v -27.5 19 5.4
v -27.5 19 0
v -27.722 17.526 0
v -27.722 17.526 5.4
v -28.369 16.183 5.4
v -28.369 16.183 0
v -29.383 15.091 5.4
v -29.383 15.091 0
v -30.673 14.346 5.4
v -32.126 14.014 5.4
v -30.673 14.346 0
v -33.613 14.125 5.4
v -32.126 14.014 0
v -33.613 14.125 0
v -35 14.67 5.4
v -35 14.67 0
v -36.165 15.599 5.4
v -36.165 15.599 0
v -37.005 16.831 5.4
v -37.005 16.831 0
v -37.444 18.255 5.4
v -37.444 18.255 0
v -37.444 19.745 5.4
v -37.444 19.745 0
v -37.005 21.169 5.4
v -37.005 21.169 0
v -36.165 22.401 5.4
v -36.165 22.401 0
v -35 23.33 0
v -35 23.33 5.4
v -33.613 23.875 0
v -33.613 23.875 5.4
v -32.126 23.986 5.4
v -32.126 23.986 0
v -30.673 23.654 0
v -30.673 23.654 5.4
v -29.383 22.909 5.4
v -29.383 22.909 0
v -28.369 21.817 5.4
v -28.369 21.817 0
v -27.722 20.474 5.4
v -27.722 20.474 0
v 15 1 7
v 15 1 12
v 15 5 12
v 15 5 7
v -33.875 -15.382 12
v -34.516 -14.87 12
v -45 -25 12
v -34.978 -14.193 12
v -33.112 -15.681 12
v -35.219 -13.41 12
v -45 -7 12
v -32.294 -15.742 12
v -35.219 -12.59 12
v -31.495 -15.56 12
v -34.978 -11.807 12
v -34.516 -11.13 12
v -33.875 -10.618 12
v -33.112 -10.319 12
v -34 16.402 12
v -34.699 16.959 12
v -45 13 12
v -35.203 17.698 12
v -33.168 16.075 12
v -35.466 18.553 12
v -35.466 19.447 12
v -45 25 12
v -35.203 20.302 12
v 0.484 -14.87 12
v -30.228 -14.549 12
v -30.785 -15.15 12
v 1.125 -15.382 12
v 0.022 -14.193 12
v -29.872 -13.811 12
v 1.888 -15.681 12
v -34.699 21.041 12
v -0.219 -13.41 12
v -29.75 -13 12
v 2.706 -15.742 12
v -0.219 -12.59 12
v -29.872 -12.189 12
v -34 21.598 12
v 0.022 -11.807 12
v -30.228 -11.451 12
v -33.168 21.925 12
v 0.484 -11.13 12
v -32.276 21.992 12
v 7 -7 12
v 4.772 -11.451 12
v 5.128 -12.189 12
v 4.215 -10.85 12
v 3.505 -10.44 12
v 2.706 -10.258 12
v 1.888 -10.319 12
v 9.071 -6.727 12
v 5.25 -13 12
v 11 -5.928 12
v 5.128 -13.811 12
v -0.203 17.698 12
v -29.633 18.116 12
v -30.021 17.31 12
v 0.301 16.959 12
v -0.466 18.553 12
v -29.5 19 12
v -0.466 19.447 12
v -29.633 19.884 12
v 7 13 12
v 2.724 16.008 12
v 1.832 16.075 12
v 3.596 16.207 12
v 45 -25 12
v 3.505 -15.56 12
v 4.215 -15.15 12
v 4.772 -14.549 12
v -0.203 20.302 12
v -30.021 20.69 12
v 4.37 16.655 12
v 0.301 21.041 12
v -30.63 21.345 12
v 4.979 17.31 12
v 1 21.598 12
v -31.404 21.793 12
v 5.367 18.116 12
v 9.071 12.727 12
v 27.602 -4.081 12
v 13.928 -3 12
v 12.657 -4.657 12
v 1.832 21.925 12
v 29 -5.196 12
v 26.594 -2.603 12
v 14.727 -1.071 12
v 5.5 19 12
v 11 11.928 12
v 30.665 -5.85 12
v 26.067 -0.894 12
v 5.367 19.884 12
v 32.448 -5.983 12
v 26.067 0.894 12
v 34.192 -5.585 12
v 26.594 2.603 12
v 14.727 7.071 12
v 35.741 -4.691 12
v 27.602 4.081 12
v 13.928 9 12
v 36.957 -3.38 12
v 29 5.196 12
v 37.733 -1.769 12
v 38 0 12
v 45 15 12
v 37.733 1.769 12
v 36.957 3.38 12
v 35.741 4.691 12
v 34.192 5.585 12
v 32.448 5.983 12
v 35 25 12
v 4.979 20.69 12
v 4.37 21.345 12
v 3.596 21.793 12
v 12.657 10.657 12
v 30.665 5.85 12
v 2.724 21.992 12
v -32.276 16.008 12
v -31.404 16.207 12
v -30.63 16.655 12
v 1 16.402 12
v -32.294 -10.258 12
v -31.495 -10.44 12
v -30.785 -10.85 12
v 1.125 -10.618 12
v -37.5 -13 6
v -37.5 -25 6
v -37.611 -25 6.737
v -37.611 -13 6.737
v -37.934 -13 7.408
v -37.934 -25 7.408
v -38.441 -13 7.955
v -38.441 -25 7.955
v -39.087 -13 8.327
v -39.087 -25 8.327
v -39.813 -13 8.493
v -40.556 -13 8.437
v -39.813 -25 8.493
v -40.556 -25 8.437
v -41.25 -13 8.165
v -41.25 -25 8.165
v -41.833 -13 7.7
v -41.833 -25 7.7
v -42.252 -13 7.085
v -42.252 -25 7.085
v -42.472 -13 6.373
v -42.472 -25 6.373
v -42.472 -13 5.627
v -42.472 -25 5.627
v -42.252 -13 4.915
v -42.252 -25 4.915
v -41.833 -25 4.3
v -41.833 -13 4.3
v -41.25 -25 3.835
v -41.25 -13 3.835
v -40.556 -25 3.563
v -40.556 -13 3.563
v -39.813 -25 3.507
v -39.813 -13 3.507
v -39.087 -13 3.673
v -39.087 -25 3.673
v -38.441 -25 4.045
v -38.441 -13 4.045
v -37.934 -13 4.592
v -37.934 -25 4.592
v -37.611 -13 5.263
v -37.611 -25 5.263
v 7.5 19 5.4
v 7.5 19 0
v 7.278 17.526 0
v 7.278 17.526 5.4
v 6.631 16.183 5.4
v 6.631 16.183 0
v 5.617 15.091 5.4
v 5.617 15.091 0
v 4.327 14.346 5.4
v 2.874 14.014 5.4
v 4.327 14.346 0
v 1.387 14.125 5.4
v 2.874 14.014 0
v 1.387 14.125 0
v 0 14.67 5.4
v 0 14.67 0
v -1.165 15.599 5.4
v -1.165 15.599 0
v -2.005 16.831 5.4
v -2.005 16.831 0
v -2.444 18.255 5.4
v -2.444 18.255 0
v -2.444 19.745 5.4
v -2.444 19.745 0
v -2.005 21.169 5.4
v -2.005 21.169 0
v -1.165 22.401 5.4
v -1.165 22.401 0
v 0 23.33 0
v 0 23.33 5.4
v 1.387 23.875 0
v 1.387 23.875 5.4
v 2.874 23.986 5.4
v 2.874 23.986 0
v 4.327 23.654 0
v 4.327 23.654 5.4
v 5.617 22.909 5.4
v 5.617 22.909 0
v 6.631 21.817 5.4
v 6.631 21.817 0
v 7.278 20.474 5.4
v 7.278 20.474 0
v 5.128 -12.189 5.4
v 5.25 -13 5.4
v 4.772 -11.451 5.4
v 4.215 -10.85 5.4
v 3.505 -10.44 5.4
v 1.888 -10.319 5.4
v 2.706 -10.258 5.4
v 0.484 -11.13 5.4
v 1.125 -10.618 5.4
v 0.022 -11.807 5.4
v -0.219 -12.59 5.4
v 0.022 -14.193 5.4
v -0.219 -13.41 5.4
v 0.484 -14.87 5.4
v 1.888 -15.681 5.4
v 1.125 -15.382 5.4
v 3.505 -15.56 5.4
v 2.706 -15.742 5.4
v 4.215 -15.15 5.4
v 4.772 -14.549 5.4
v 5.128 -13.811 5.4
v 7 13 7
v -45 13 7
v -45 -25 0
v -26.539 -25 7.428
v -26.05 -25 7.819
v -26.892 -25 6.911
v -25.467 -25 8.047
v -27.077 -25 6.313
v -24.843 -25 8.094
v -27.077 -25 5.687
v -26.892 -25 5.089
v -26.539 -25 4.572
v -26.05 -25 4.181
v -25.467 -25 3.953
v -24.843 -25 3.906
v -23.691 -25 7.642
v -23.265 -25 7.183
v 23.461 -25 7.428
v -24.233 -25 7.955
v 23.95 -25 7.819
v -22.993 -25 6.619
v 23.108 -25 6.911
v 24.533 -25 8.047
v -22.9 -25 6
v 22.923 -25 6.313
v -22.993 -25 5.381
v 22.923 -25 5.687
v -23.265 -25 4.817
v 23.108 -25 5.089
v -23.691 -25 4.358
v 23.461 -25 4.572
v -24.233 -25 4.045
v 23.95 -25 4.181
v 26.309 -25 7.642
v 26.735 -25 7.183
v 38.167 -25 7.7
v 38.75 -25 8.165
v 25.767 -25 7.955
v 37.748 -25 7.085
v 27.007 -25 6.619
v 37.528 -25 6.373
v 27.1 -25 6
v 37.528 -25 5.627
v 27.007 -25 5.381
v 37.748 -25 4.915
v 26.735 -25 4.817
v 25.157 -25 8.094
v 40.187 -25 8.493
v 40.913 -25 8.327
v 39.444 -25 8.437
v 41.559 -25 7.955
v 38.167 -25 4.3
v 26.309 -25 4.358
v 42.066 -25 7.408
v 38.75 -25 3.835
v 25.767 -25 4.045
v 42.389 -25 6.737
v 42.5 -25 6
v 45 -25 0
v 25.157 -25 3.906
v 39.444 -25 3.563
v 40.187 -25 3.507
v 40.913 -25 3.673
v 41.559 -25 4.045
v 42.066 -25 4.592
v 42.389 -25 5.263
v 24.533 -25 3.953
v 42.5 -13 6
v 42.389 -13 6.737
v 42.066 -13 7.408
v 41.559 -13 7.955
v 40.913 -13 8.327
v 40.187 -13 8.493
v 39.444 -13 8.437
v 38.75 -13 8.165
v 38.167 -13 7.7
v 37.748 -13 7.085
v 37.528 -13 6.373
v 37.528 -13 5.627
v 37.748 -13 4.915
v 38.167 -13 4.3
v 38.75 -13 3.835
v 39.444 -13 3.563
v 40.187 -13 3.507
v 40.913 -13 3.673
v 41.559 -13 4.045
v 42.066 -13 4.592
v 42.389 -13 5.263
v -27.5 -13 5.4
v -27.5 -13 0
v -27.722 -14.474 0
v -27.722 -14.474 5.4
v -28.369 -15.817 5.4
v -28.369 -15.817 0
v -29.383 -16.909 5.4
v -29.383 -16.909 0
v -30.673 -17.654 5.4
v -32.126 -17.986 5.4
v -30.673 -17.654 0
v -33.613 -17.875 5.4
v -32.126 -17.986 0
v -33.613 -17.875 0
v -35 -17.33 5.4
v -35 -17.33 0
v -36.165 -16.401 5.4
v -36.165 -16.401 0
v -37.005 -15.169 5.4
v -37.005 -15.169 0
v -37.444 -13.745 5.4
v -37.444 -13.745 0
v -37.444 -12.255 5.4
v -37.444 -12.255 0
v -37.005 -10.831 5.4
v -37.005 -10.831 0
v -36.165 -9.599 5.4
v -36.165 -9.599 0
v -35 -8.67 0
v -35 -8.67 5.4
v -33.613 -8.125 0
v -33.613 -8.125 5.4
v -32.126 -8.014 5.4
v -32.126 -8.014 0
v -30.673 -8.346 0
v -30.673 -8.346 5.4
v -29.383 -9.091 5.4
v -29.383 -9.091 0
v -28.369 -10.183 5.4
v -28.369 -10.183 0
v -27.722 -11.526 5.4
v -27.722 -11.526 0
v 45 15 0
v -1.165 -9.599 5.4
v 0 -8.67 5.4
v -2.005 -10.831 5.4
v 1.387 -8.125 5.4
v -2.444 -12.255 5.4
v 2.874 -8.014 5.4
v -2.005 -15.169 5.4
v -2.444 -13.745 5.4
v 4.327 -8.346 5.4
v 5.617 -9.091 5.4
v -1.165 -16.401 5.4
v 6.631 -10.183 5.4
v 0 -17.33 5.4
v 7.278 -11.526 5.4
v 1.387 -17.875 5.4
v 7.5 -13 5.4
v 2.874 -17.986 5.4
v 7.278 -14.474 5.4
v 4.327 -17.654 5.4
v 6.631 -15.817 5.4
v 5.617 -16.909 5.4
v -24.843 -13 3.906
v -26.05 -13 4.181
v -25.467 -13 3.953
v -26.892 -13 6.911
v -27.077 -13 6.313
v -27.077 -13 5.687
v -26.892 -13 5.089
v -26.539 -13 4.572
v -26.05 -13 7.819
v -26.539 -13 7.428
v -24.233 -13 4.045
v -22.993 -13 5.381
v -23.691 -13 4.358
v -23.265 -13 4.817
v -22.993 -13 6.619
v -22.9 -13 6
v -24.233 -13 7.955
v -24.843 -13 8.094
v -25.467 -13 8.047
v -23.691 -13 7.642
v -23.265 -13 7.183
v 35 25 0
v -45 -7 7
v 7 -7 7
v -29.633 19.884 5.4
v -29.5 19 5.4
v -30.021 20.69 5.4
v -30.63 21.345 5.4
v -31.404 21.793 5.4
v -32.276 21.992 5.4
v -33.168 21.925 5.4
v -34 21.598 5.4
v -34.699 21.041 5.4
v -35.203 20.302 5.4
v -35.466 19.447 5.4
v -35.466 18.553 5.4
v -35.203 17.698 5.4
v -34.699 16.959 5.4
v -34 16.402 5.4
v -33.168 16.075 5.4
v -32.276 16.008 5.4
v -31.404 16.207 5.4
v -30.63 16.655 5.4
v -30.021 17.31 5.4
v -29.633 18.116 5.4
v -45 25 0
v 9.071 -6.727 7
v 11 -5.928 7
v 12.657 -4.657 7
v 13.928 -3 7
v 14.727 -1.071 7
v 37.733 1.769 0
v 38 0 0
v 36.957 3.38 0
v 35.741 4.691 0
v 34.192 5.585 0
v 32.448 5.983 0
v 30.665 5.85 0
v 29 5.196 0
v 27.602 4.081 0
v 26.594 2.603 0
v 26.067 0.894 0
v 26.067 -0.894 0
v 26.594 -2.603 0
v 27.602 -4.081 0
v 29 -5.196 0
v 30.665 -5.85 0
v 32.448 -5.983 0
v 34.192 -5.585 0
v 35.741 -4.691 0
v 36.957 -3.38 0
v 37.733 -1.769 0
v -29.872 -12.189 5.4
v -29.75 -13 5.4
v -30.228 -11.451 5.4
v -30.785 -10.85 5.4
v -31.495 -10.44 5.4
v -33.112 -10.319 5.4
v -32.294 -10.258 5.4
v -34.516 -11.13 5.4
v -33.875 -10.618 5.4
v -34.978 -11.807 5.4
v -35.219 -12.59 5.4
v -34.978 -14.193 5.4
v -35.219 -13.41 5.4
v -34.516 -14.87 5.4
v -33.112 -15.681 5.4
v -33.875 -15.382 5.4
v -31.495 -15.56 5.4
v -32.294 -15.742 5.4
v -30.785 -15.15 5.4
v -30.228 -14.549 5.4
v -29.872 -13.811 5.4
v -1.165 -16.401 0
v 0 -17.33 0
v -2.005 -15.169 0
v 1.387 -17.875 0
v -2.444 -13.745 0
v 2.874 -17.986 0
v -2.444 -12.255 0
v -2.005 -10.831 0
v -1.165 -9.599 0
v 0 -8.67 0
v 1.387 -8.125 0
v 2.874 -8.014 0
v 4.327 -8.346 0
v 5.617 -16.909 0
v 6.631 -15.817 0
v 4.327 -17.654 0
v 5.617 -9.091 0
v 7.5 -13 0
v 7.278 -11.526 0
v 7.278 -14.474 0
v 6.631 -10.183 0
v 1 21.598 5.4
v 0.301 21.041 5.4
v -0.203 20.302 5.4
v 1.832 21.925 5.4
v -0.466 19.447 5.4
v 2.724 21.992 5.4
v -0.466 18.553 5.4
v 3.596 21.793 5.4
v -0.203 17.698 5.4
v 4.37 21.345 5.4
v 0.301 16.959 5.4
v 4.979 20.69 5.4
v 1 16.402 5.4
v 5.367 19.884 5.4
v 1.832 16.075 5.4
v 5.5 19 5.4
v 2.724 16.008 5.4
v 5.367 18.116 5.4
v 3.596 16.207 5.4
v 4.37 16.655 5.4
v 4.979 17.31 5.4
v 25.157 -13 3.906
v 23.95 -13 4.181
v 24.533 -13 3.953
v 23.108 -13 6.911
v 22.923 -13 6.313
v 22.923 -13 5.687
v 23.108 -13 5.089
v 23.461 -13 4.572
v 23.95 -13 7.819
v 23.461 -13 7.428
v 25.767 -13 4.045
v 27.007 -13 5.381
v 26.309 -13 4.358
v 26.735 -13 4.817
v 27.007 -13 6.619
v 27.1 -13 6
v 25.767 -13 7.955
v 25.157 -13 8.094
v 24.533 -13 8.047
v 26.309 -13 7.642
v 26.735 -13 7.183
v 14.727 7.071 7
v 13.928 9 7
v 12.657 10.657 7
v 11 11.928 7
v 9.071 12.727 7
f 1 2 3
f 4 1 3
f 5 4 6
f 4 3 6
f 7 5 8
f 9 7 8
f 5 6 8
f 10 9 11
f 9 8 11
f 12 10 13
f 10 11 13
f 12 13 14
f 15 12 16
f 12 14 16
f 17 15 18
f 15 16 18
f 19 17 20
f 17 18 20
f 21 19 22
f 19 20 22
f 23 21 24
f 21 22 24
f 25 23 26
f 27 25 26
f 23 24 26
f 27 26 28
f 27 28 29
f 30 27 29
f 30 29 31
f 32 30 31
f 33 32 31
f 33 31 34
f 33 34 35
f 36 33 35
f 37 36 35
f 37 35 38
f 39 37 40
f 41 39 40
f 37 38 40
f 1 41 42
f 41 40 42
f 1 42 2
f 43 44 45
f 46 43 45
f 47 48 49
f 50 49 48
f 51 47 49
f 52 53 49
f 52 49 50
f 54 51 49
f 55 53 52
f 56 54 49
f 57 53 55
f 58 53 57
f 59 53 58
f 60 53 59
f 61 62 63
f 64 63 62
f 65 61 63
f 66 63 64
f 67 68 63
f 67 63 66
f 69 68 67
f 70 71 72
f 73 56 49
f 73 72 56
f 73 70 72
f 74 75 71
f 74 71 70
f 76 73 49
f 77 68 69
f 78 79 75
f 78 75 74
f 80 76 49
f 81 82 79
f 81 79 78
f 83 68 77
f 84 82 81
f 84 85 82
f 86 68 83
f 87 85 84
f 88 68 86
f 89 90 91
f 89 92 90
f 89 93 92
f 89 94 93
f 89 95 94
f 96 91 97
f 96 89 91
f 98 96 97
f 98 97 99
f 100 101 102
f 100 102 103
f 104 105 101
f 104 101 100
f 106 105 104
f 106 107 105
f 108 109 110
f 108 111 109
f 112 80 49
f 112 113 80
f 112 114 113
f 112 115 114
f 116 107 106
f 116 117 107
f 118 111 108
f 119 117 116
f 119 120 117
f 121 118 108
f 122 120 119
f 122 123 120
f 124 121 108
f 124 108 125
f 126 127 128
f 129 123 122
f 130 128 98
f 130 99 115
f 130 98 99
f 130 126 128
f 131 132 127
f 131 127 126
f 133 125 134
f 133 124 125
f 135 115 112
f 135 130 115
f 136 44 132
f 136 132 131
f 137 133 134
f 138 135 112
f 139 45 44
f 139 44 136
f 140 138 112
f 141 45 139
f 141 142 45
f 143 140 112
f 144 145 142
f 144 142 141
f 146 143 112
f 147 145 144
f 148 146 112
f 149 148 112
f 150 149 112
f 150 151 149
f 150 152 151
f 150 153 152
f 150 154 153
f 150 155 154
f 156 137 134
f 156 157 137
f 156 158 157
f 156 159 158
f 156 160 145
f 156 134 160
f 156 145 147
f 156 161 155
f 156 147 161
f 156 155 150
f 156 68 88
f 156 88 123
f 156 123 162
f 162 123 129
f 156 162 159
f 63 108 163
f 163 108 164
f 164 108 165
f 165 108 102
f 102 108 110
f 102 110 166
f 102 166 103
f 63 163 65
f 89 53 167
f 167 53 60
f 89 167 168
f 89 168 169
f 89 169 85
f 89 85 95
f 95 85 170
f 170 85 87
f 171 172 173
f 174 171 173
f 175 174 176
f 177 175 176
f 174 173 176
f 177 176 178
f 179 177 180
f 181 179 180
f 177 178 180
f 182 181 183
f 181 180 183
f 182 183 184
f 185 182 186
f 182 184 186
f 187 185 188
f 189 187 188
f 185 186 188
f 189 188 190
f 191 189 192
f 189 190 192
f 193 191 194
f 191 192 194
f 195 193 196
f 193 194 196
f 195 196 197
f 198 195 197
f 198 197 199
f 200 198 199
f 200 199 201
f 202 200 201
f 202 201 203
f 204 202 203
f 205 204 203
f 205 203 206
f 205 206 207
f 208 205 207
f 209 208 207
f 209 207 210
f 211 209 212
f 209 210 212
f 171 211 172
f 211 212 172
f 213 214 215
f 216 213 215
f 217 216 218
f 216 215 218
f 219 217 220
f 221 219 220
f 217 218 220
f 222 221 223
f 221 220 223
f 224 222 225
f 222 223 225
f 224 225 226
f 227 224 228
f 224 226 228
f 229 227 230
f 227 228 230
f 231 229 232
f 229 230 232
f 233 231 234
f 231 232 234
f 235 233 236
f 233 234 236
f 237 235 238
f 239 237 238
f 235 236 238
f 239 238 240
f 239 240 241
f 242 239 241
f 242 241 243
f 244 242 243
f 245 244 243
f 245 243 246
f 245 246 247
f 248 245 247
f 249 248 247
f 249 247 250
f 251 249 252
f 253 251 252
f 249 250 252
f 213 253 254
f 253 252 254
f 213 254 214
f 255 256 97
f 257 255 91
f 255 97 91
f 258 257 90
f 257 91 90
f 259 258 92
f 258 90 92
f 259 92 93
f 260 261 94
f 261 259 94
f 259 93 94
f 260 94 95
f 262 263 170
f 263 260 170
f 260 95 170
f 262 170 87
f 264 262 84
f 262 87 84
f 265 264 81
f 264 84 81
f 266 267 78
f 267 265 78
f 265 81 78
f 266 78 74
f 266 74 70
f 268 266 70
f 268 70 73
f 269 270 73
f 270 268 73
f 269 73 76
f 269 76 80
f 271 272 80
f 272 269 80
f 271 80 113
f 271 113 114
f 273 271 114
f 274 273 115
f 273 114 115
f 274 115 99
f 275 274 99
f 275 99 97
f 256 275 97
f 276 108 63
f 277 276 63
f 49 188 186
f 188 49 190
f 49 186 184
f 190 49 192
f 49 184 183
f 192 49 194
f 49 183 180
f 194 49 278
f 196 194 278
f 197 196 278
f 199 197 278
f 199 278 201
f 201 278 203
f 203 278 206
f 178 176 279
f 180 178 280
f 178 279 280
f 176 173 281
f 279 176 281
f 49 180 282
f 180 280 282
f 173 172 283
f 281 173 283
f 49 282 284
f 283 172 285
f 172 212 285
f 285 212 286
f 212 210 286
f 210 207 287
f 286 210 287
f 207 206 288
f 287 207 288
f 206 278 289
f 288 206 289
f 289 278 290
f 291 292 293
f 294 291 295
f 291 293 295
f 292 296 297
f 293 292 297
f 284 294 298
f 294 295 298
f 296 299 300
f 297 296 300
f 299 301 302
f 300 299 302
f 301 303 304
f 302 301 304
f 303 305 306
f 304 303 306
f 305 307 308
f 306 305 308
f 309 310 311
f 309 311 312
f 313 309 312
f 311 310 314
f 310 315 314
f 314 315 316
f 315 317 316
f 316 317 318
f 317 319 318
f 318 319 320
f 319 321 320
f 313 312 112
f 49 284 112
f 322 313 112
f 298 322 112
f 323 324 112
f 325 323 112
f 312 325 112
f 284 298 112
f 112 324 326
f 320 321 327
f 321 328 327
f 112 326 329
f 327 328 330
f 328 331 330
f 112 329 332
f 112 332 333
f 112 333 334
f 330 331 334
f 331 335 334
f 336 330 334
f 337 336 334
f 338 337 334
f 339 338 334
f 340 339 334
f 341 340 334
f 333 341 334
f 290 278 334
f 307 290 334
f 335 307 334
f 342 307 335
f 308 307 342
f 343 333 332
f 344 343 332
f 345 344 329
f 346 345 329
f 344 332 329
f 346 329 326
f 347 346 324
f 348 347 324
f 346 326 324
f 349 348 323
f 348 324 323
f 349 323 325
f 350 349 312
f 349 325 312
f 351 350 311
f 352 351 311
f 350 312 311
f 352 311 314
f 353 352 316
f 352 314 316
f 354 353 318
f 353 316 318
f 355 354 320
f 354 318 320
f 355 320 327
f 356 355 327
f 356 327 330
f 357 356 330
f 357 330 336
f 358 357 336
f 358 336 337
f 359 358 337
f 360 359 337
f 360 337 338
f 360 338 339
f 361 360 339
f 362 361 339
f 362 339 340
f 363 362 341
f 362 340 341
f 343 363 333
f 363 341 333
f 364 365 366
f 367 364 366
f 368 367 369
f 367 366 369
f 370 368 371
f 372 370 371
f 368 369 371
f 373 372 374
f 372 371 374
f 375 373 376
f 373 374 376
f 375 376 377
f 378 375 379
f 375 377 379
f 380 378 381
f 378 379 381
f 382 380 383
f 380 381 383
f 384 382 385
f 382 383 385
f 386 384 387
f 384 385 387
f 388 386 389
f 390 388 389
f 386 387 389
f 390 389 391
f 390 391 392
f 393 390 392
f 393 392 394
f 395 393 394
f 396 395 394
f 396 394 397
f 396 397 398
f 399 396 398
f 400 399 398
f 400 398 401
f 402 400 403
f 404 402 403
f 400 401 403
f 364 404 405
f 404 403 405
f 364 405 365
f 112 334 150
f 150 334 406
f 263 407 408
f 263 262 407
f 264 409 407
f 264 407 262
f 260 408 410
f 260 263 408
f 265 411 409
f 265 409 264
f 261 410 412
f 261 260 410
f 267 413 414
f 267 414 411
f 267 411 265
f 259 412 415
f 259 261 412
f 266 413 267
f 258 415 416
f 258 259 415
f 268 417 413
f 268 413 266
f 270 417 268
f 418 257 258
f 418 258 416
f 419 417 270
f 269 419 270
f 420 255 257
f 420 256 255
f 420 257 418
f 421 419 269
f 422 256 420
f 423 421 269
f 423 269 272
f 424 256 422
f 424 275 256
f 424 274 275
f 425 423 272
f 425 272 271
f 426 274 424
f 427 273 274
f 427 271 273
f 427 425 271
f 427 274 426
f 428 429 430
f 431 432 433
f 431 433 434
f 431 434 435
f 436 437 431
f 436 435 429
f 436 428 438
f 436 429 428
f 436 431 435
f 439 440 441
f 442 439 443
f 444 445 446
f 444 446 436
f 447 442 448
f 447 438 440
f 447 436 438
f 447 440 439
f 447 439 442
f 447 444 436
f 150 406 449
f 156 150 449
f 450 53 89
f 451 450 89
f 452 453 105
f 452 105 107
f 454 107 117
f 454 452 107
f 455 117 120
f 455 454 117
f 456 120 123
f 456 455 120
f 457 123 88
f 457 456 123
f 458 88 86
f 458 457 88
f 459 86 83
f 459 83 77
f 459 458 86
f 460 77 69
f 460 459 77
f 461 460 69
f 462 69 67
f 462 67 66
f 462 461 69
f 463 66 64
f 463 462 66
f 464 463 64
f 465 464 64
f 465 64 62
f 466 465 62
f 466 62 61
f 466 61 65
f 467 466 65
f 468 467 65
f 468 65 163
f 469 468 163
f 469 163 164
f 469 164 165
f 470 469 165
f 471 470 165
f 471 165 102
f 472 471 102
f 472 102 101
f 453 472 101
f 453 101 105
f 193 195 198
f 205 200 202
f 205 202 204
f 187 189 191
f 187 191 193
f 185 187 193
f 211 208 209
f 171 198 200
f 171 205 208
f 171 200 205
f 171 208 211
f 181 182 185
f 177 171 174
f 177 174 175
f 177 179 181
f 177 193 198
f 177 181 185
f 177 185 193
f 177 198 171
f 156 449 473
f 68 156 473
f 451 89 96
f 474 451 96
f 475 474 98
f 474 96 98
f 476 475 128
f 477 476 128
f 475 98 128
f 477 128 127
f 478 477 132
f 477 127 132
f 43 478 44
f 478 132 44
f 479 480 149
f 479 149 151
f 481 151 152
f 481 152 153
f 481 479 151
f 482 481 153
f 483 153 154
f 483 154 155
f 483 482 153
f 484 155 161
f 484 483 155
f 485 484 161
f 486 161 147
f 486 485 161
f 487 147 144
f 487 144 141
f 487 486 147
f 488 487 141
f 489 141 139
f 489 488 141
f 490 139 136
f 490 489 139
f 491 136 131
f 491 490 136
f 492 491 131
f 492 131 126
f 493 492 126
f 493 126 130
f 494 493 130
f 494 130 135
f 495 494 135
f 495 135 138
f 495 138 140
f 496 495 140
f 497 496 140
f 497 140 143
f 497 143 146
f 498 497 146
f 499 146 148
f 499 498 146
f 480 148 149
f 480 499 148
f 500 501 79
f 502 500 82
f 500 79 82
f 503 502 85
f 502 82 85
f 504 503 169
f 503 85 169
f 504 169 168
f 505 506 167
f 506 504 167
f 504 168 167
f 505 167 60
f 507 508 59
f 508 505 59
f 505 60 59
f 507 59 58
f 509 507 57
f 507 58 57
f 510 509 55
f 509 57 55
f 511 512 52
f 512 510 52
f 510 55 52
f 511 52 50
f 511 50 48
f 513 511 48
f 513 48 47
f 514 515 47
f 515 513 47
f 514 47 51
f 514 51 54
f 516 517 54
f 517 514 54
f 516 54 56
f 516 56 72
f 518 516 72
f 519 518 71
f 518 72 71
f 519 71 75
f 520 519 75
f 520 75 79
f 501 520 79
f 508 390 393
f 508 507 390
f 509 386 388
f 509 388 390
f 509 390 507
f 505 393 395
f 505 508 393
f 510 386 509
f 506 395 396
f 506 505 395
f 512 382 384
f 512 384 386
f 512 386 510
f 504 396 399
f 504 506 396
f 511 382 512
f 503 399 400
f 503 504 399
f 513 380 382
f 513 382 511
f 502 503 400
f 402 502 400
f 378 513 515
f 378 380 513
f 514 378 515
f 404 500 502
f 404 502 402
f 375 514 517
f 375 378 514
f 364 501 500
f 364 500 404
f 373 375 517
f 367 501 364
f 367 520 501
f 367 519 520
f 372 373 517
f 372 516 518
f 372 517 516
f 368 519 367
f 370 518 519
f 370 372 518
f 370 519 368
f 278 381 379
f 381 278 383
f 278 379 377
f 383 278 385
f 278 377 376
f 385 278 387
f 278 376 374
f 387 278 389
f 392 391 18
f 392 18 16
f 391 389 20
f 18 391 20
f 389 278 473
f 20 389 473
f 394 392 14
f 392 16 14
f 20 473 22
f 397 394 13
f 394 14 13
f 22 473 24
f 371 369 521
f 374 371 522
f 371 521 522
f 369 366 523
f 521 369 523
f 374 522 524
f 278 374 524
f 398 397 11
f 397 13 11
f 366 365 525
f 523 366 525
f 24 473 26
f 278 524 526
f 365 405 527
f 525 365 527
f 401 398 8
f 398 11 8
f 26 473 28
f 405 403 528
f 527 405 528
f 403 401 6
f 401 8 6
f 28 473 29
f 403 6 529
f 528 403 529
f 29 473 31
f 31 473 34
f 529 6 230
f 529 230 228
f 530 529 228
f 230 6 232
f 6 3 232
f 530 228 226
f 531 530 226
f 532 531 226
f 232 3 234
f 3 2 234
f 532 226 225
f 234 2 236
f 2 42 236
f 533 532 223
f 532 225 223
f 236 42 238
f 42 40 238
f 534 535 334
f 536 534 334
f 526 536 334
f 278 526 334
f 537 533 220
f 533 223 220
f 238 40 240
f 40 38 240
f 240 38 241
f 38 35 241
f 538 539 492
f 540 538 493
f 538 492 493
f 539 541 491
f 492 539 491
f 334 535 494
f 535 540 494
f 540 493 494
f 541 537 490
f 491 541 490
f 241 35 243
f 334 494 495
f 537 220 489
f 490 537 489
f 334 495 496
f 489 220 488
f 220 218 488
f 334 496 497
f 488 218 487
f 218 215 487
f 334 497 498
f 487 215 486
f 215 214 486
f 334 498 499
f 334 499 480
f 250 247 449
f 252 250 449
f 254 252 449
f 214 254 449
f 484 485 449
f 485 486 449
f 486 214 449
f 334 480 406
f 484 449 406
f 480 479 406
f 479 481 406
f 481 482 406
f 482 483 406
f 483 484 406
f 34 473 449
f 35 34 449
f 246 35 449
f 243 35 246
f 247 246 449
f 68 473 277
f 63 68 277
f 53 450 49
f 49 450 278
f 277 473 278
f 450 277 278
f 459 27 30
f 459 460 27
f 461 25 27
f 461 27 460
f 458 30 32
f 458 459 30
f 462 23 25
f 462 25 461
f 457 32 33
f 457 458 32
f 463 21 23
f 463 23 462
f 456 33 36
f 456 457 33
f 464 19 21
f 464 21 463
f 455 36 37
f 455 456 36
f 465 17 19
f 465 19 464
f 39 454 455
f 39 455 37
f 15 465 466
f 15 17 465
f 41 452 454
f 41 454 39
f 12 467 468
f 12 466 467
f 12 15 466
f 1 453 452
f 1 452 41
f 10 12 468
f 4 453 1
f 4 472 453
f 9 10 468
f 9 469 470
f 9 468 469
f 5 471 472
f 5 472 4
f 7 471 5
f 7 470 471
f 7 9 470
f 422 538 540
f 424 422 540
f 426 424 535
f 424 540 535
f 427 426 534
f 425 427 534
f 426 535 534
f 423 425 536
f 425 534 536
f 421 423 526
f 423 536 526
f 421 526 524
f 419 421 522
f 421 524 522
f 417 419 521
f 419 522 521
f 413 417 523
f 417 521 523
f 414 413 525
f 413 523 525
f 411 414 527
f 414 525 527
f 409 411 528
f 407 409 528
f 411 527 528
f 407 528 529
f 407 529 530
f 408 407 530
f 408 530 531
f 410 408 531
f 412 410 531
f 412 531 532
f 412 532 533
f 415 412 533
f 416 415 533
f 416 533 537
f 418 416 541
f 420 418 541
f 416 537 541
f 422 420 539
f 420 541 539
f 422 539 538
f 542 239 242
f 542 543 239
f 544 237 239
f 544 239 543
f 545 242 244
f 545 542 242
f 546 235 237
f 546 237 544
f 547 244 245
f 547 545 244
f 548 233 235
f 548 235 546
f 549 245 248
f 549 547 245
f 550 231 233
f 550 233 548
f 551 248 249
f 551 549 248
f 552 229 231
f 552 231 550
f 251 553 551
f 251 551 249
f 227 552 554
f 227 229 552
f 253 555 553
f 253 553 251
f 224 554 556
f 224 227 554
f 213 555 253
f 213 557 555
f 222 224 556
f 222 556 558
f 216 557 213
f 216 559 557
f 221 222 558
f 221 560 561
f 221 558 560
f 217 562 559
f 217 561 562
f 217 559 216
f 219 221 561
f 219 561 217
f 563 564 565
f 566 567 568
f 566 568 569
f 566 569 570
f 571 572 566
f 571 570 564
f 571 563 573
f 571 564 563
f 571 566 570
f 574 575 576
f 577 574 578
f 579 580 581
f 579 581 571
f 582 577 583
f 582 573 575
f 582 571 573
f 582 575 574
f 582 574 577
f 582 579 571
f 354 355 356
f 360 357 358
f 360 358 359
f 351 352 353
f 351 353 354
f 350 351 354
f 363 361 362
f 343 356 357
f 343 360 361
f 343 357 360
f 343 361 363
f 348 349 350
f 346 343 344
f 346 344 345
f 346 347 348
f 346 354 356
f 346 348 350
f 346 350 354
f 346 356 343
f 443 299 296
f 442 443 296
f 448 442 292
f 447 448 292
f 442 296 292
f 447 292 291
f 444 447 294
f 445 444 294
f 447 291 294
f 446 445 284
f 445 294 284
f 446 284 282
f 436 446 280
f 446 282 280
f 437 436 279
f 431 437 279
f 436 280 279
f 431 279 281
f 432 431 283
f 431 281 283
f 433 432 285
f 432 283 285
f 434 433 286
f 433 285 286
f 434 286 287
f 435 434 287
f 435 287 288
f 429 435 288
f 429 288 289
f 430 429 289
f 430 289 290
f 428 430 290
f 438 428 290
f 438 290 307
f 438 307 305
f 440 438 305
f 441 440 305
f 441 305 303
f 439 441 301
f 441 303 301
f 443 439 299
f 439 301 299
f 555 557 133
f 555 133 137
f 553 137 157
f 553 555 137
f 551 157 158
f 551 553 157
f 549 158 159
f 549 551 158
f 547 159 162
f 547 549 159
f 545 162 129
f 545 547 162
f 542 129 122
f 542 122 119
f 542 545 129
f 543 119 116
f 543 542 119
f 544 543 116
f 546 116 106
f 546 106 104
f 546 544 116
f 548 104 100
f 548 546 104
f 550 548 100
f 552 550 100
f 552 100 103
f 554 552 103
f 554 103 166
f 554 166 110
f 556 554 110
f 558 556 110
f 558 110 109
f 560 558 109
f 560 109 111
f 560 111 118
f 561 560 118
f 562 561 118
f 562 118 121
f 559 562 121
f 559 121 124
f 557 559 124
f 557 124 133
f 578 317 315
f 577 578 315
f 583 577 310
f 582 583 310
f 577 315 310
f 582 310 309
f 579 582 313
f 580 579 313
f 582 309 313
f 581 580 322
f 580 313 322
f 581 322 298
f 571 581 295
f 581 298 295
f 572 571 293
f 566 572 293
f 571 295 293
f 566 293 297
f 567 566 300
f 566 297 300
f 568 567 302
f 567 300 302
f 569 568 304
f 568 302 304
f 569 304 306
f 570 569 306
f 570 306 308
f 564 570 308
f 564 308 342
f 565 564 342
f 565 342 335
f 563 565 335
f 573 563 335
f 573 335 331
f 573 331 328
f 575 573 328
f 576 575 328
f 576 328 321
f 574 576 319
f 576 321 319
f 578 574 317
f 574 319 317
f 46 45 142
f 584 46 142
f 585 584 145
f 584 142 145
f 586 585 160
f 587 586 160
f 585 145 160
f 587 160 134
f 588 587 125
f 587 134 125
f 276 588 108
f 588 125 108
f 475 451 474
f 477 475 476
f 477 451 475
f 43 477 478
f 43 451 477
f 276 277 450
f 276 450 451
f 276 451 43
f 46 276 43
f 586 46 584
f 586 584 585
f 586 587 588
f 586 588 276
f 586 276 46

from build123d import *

# Parameters (mm, degrees)
F0_R     = 3
F0_R_2   = 6
F1_DEPTH = 12
F3_DEPTH = 5
F4_R     = 2.75
F5_DEPTH = 25
F6_R     = 2.5
F6_R_2   = 2.1
F7_DEPTH = 12
F8_R     = 5
F8_R_2   = 3
F8_R_3   = 2.75
F9_DEPTH = 5.4


with BuildPart() as f1:
    # F0 (on Top) → F1 (new body)
    with BuildSketch(Plane.XY):
        with BuildLine():
            Line((-45, -25), (45, -25))
            Line((45, -25), (45, 15))
            Line((45, 15), (35, 25))
            Line((35, 25), (-45, 25))
            Line((-45, 25), (-45, 13))
            Line((-45, 13), (7, 13))
            ThreePointArc((7, 13), (12.656854, 10.656854), (15, 5))
            Line((15, 5), (15, 1))
            ThreePointArc((15, 1), (12.656854, -4.656854), (7, -7))
            Line((7, -7), (-45, -7))
            Line((-45, -7), (-45, -25))
        make_face()
        with Locations((-32.5, 19)):
            Circle(F0_R, mode=Mode.SUBTRACT)
        with Locations((32, 0)):
            Circle(F0_R_2, mode=Mode.SUBTRACT)
        with Locations((2.5, 19)):
            Circle(F0_R, mode=Mode.SUBTRACT)
        with BuildLine():
            Line((-45, 13), (-45, -7))
            Line((-45, -7), (7, -7))
            ThreePointArc((7, -7), (12.656854, -4.656854), (15, 1))
            Line((15, 1), (15, 5))
            ThreePointArc((15, 5), (12.656854, 10.656854), (7, 13))
            Line((7, 13), (-45, 13))
        make_face()
    extrude(amount=F1_DEPTH)

    # F2 (on face) → F3 (cut)
    with BuildSketch(Plane.XY.offset(12)):
        with BuildLine():
            Line((-45, 13), (-45, -7))
            Line((-45, -7), (7, -7))
            ThreePointArc((7, -7), (12.656854, -4.656854), (15, 1))
            Line((15, 1), (15, 5))
            ThreePointArc((15, 5), (12.656854, 10.656854), (7, 13))
            Line((7, 13), (-45, 13))
        make_face()
    extrude(amount=-F3_DEPTH, mode=Mode.SUBTRACT)

    # F4 (on face) → F5 (cut)
    with BuildSketch(Plane.XY.offset(12)):
        with Locations((-32.5, -13)):
            Circle(F4_R)
        with Locations((2.5, -13)):
            Circle(F4_R)
    extrude(amount=-F5_DEPTH, mode=Mode.SUBTRACT)

    # F6 (on face) → F7 (cut)
    with BuildSketch(Plane.XZ.offset(25)):
        with Locations((-40, 6)):
            Circle(F6_R)
        with Locations((-25, 6)):
            Circle(F6_R_2)
        with Locations((25, 6)):
            Circle(F6_R_2)
        with Locations((40, 6)):
            Circle(F6_R)
    extrude(amount=-F7_DEPTH, mode=Mode.SUBTRACT)

    # F8 (on face) → F9 (cut)
    with BuildSketch(Plane(origin=(0, 0, 0), x_dir=(1, 0, 0), z_dir=(0, 0, -1))):
        with Locations((2.5, -19)):
            Circle(F8_R)
        with Locations((2.5, -19)):
            Circle(F8_R_2, mode=Mode.SUBTRACT)
        with Locations((2.5, 13)):
            Circle(F8_R)
        with Locations((2.5, 13)):
            Circle(F8_R_3, mode=Mode.SUBTRACT)
        with Locations((-32.5, -19)):
            Circle(F8_R)
        with Locations((-32.5, -19)):
            Circle(F8_R_2, mode=Mode.SUBTRACT)
        with Locations((-32.5, 13)):
            Circle(F8_R)
        with Locations((-32.5, 13)):
            Circle(F8_R_3, mode=Mode.SUBTRACT)
    extrude(amount=-F9_DEPTH, mode=Mode.SUBTRACT)


solid = f1.part
